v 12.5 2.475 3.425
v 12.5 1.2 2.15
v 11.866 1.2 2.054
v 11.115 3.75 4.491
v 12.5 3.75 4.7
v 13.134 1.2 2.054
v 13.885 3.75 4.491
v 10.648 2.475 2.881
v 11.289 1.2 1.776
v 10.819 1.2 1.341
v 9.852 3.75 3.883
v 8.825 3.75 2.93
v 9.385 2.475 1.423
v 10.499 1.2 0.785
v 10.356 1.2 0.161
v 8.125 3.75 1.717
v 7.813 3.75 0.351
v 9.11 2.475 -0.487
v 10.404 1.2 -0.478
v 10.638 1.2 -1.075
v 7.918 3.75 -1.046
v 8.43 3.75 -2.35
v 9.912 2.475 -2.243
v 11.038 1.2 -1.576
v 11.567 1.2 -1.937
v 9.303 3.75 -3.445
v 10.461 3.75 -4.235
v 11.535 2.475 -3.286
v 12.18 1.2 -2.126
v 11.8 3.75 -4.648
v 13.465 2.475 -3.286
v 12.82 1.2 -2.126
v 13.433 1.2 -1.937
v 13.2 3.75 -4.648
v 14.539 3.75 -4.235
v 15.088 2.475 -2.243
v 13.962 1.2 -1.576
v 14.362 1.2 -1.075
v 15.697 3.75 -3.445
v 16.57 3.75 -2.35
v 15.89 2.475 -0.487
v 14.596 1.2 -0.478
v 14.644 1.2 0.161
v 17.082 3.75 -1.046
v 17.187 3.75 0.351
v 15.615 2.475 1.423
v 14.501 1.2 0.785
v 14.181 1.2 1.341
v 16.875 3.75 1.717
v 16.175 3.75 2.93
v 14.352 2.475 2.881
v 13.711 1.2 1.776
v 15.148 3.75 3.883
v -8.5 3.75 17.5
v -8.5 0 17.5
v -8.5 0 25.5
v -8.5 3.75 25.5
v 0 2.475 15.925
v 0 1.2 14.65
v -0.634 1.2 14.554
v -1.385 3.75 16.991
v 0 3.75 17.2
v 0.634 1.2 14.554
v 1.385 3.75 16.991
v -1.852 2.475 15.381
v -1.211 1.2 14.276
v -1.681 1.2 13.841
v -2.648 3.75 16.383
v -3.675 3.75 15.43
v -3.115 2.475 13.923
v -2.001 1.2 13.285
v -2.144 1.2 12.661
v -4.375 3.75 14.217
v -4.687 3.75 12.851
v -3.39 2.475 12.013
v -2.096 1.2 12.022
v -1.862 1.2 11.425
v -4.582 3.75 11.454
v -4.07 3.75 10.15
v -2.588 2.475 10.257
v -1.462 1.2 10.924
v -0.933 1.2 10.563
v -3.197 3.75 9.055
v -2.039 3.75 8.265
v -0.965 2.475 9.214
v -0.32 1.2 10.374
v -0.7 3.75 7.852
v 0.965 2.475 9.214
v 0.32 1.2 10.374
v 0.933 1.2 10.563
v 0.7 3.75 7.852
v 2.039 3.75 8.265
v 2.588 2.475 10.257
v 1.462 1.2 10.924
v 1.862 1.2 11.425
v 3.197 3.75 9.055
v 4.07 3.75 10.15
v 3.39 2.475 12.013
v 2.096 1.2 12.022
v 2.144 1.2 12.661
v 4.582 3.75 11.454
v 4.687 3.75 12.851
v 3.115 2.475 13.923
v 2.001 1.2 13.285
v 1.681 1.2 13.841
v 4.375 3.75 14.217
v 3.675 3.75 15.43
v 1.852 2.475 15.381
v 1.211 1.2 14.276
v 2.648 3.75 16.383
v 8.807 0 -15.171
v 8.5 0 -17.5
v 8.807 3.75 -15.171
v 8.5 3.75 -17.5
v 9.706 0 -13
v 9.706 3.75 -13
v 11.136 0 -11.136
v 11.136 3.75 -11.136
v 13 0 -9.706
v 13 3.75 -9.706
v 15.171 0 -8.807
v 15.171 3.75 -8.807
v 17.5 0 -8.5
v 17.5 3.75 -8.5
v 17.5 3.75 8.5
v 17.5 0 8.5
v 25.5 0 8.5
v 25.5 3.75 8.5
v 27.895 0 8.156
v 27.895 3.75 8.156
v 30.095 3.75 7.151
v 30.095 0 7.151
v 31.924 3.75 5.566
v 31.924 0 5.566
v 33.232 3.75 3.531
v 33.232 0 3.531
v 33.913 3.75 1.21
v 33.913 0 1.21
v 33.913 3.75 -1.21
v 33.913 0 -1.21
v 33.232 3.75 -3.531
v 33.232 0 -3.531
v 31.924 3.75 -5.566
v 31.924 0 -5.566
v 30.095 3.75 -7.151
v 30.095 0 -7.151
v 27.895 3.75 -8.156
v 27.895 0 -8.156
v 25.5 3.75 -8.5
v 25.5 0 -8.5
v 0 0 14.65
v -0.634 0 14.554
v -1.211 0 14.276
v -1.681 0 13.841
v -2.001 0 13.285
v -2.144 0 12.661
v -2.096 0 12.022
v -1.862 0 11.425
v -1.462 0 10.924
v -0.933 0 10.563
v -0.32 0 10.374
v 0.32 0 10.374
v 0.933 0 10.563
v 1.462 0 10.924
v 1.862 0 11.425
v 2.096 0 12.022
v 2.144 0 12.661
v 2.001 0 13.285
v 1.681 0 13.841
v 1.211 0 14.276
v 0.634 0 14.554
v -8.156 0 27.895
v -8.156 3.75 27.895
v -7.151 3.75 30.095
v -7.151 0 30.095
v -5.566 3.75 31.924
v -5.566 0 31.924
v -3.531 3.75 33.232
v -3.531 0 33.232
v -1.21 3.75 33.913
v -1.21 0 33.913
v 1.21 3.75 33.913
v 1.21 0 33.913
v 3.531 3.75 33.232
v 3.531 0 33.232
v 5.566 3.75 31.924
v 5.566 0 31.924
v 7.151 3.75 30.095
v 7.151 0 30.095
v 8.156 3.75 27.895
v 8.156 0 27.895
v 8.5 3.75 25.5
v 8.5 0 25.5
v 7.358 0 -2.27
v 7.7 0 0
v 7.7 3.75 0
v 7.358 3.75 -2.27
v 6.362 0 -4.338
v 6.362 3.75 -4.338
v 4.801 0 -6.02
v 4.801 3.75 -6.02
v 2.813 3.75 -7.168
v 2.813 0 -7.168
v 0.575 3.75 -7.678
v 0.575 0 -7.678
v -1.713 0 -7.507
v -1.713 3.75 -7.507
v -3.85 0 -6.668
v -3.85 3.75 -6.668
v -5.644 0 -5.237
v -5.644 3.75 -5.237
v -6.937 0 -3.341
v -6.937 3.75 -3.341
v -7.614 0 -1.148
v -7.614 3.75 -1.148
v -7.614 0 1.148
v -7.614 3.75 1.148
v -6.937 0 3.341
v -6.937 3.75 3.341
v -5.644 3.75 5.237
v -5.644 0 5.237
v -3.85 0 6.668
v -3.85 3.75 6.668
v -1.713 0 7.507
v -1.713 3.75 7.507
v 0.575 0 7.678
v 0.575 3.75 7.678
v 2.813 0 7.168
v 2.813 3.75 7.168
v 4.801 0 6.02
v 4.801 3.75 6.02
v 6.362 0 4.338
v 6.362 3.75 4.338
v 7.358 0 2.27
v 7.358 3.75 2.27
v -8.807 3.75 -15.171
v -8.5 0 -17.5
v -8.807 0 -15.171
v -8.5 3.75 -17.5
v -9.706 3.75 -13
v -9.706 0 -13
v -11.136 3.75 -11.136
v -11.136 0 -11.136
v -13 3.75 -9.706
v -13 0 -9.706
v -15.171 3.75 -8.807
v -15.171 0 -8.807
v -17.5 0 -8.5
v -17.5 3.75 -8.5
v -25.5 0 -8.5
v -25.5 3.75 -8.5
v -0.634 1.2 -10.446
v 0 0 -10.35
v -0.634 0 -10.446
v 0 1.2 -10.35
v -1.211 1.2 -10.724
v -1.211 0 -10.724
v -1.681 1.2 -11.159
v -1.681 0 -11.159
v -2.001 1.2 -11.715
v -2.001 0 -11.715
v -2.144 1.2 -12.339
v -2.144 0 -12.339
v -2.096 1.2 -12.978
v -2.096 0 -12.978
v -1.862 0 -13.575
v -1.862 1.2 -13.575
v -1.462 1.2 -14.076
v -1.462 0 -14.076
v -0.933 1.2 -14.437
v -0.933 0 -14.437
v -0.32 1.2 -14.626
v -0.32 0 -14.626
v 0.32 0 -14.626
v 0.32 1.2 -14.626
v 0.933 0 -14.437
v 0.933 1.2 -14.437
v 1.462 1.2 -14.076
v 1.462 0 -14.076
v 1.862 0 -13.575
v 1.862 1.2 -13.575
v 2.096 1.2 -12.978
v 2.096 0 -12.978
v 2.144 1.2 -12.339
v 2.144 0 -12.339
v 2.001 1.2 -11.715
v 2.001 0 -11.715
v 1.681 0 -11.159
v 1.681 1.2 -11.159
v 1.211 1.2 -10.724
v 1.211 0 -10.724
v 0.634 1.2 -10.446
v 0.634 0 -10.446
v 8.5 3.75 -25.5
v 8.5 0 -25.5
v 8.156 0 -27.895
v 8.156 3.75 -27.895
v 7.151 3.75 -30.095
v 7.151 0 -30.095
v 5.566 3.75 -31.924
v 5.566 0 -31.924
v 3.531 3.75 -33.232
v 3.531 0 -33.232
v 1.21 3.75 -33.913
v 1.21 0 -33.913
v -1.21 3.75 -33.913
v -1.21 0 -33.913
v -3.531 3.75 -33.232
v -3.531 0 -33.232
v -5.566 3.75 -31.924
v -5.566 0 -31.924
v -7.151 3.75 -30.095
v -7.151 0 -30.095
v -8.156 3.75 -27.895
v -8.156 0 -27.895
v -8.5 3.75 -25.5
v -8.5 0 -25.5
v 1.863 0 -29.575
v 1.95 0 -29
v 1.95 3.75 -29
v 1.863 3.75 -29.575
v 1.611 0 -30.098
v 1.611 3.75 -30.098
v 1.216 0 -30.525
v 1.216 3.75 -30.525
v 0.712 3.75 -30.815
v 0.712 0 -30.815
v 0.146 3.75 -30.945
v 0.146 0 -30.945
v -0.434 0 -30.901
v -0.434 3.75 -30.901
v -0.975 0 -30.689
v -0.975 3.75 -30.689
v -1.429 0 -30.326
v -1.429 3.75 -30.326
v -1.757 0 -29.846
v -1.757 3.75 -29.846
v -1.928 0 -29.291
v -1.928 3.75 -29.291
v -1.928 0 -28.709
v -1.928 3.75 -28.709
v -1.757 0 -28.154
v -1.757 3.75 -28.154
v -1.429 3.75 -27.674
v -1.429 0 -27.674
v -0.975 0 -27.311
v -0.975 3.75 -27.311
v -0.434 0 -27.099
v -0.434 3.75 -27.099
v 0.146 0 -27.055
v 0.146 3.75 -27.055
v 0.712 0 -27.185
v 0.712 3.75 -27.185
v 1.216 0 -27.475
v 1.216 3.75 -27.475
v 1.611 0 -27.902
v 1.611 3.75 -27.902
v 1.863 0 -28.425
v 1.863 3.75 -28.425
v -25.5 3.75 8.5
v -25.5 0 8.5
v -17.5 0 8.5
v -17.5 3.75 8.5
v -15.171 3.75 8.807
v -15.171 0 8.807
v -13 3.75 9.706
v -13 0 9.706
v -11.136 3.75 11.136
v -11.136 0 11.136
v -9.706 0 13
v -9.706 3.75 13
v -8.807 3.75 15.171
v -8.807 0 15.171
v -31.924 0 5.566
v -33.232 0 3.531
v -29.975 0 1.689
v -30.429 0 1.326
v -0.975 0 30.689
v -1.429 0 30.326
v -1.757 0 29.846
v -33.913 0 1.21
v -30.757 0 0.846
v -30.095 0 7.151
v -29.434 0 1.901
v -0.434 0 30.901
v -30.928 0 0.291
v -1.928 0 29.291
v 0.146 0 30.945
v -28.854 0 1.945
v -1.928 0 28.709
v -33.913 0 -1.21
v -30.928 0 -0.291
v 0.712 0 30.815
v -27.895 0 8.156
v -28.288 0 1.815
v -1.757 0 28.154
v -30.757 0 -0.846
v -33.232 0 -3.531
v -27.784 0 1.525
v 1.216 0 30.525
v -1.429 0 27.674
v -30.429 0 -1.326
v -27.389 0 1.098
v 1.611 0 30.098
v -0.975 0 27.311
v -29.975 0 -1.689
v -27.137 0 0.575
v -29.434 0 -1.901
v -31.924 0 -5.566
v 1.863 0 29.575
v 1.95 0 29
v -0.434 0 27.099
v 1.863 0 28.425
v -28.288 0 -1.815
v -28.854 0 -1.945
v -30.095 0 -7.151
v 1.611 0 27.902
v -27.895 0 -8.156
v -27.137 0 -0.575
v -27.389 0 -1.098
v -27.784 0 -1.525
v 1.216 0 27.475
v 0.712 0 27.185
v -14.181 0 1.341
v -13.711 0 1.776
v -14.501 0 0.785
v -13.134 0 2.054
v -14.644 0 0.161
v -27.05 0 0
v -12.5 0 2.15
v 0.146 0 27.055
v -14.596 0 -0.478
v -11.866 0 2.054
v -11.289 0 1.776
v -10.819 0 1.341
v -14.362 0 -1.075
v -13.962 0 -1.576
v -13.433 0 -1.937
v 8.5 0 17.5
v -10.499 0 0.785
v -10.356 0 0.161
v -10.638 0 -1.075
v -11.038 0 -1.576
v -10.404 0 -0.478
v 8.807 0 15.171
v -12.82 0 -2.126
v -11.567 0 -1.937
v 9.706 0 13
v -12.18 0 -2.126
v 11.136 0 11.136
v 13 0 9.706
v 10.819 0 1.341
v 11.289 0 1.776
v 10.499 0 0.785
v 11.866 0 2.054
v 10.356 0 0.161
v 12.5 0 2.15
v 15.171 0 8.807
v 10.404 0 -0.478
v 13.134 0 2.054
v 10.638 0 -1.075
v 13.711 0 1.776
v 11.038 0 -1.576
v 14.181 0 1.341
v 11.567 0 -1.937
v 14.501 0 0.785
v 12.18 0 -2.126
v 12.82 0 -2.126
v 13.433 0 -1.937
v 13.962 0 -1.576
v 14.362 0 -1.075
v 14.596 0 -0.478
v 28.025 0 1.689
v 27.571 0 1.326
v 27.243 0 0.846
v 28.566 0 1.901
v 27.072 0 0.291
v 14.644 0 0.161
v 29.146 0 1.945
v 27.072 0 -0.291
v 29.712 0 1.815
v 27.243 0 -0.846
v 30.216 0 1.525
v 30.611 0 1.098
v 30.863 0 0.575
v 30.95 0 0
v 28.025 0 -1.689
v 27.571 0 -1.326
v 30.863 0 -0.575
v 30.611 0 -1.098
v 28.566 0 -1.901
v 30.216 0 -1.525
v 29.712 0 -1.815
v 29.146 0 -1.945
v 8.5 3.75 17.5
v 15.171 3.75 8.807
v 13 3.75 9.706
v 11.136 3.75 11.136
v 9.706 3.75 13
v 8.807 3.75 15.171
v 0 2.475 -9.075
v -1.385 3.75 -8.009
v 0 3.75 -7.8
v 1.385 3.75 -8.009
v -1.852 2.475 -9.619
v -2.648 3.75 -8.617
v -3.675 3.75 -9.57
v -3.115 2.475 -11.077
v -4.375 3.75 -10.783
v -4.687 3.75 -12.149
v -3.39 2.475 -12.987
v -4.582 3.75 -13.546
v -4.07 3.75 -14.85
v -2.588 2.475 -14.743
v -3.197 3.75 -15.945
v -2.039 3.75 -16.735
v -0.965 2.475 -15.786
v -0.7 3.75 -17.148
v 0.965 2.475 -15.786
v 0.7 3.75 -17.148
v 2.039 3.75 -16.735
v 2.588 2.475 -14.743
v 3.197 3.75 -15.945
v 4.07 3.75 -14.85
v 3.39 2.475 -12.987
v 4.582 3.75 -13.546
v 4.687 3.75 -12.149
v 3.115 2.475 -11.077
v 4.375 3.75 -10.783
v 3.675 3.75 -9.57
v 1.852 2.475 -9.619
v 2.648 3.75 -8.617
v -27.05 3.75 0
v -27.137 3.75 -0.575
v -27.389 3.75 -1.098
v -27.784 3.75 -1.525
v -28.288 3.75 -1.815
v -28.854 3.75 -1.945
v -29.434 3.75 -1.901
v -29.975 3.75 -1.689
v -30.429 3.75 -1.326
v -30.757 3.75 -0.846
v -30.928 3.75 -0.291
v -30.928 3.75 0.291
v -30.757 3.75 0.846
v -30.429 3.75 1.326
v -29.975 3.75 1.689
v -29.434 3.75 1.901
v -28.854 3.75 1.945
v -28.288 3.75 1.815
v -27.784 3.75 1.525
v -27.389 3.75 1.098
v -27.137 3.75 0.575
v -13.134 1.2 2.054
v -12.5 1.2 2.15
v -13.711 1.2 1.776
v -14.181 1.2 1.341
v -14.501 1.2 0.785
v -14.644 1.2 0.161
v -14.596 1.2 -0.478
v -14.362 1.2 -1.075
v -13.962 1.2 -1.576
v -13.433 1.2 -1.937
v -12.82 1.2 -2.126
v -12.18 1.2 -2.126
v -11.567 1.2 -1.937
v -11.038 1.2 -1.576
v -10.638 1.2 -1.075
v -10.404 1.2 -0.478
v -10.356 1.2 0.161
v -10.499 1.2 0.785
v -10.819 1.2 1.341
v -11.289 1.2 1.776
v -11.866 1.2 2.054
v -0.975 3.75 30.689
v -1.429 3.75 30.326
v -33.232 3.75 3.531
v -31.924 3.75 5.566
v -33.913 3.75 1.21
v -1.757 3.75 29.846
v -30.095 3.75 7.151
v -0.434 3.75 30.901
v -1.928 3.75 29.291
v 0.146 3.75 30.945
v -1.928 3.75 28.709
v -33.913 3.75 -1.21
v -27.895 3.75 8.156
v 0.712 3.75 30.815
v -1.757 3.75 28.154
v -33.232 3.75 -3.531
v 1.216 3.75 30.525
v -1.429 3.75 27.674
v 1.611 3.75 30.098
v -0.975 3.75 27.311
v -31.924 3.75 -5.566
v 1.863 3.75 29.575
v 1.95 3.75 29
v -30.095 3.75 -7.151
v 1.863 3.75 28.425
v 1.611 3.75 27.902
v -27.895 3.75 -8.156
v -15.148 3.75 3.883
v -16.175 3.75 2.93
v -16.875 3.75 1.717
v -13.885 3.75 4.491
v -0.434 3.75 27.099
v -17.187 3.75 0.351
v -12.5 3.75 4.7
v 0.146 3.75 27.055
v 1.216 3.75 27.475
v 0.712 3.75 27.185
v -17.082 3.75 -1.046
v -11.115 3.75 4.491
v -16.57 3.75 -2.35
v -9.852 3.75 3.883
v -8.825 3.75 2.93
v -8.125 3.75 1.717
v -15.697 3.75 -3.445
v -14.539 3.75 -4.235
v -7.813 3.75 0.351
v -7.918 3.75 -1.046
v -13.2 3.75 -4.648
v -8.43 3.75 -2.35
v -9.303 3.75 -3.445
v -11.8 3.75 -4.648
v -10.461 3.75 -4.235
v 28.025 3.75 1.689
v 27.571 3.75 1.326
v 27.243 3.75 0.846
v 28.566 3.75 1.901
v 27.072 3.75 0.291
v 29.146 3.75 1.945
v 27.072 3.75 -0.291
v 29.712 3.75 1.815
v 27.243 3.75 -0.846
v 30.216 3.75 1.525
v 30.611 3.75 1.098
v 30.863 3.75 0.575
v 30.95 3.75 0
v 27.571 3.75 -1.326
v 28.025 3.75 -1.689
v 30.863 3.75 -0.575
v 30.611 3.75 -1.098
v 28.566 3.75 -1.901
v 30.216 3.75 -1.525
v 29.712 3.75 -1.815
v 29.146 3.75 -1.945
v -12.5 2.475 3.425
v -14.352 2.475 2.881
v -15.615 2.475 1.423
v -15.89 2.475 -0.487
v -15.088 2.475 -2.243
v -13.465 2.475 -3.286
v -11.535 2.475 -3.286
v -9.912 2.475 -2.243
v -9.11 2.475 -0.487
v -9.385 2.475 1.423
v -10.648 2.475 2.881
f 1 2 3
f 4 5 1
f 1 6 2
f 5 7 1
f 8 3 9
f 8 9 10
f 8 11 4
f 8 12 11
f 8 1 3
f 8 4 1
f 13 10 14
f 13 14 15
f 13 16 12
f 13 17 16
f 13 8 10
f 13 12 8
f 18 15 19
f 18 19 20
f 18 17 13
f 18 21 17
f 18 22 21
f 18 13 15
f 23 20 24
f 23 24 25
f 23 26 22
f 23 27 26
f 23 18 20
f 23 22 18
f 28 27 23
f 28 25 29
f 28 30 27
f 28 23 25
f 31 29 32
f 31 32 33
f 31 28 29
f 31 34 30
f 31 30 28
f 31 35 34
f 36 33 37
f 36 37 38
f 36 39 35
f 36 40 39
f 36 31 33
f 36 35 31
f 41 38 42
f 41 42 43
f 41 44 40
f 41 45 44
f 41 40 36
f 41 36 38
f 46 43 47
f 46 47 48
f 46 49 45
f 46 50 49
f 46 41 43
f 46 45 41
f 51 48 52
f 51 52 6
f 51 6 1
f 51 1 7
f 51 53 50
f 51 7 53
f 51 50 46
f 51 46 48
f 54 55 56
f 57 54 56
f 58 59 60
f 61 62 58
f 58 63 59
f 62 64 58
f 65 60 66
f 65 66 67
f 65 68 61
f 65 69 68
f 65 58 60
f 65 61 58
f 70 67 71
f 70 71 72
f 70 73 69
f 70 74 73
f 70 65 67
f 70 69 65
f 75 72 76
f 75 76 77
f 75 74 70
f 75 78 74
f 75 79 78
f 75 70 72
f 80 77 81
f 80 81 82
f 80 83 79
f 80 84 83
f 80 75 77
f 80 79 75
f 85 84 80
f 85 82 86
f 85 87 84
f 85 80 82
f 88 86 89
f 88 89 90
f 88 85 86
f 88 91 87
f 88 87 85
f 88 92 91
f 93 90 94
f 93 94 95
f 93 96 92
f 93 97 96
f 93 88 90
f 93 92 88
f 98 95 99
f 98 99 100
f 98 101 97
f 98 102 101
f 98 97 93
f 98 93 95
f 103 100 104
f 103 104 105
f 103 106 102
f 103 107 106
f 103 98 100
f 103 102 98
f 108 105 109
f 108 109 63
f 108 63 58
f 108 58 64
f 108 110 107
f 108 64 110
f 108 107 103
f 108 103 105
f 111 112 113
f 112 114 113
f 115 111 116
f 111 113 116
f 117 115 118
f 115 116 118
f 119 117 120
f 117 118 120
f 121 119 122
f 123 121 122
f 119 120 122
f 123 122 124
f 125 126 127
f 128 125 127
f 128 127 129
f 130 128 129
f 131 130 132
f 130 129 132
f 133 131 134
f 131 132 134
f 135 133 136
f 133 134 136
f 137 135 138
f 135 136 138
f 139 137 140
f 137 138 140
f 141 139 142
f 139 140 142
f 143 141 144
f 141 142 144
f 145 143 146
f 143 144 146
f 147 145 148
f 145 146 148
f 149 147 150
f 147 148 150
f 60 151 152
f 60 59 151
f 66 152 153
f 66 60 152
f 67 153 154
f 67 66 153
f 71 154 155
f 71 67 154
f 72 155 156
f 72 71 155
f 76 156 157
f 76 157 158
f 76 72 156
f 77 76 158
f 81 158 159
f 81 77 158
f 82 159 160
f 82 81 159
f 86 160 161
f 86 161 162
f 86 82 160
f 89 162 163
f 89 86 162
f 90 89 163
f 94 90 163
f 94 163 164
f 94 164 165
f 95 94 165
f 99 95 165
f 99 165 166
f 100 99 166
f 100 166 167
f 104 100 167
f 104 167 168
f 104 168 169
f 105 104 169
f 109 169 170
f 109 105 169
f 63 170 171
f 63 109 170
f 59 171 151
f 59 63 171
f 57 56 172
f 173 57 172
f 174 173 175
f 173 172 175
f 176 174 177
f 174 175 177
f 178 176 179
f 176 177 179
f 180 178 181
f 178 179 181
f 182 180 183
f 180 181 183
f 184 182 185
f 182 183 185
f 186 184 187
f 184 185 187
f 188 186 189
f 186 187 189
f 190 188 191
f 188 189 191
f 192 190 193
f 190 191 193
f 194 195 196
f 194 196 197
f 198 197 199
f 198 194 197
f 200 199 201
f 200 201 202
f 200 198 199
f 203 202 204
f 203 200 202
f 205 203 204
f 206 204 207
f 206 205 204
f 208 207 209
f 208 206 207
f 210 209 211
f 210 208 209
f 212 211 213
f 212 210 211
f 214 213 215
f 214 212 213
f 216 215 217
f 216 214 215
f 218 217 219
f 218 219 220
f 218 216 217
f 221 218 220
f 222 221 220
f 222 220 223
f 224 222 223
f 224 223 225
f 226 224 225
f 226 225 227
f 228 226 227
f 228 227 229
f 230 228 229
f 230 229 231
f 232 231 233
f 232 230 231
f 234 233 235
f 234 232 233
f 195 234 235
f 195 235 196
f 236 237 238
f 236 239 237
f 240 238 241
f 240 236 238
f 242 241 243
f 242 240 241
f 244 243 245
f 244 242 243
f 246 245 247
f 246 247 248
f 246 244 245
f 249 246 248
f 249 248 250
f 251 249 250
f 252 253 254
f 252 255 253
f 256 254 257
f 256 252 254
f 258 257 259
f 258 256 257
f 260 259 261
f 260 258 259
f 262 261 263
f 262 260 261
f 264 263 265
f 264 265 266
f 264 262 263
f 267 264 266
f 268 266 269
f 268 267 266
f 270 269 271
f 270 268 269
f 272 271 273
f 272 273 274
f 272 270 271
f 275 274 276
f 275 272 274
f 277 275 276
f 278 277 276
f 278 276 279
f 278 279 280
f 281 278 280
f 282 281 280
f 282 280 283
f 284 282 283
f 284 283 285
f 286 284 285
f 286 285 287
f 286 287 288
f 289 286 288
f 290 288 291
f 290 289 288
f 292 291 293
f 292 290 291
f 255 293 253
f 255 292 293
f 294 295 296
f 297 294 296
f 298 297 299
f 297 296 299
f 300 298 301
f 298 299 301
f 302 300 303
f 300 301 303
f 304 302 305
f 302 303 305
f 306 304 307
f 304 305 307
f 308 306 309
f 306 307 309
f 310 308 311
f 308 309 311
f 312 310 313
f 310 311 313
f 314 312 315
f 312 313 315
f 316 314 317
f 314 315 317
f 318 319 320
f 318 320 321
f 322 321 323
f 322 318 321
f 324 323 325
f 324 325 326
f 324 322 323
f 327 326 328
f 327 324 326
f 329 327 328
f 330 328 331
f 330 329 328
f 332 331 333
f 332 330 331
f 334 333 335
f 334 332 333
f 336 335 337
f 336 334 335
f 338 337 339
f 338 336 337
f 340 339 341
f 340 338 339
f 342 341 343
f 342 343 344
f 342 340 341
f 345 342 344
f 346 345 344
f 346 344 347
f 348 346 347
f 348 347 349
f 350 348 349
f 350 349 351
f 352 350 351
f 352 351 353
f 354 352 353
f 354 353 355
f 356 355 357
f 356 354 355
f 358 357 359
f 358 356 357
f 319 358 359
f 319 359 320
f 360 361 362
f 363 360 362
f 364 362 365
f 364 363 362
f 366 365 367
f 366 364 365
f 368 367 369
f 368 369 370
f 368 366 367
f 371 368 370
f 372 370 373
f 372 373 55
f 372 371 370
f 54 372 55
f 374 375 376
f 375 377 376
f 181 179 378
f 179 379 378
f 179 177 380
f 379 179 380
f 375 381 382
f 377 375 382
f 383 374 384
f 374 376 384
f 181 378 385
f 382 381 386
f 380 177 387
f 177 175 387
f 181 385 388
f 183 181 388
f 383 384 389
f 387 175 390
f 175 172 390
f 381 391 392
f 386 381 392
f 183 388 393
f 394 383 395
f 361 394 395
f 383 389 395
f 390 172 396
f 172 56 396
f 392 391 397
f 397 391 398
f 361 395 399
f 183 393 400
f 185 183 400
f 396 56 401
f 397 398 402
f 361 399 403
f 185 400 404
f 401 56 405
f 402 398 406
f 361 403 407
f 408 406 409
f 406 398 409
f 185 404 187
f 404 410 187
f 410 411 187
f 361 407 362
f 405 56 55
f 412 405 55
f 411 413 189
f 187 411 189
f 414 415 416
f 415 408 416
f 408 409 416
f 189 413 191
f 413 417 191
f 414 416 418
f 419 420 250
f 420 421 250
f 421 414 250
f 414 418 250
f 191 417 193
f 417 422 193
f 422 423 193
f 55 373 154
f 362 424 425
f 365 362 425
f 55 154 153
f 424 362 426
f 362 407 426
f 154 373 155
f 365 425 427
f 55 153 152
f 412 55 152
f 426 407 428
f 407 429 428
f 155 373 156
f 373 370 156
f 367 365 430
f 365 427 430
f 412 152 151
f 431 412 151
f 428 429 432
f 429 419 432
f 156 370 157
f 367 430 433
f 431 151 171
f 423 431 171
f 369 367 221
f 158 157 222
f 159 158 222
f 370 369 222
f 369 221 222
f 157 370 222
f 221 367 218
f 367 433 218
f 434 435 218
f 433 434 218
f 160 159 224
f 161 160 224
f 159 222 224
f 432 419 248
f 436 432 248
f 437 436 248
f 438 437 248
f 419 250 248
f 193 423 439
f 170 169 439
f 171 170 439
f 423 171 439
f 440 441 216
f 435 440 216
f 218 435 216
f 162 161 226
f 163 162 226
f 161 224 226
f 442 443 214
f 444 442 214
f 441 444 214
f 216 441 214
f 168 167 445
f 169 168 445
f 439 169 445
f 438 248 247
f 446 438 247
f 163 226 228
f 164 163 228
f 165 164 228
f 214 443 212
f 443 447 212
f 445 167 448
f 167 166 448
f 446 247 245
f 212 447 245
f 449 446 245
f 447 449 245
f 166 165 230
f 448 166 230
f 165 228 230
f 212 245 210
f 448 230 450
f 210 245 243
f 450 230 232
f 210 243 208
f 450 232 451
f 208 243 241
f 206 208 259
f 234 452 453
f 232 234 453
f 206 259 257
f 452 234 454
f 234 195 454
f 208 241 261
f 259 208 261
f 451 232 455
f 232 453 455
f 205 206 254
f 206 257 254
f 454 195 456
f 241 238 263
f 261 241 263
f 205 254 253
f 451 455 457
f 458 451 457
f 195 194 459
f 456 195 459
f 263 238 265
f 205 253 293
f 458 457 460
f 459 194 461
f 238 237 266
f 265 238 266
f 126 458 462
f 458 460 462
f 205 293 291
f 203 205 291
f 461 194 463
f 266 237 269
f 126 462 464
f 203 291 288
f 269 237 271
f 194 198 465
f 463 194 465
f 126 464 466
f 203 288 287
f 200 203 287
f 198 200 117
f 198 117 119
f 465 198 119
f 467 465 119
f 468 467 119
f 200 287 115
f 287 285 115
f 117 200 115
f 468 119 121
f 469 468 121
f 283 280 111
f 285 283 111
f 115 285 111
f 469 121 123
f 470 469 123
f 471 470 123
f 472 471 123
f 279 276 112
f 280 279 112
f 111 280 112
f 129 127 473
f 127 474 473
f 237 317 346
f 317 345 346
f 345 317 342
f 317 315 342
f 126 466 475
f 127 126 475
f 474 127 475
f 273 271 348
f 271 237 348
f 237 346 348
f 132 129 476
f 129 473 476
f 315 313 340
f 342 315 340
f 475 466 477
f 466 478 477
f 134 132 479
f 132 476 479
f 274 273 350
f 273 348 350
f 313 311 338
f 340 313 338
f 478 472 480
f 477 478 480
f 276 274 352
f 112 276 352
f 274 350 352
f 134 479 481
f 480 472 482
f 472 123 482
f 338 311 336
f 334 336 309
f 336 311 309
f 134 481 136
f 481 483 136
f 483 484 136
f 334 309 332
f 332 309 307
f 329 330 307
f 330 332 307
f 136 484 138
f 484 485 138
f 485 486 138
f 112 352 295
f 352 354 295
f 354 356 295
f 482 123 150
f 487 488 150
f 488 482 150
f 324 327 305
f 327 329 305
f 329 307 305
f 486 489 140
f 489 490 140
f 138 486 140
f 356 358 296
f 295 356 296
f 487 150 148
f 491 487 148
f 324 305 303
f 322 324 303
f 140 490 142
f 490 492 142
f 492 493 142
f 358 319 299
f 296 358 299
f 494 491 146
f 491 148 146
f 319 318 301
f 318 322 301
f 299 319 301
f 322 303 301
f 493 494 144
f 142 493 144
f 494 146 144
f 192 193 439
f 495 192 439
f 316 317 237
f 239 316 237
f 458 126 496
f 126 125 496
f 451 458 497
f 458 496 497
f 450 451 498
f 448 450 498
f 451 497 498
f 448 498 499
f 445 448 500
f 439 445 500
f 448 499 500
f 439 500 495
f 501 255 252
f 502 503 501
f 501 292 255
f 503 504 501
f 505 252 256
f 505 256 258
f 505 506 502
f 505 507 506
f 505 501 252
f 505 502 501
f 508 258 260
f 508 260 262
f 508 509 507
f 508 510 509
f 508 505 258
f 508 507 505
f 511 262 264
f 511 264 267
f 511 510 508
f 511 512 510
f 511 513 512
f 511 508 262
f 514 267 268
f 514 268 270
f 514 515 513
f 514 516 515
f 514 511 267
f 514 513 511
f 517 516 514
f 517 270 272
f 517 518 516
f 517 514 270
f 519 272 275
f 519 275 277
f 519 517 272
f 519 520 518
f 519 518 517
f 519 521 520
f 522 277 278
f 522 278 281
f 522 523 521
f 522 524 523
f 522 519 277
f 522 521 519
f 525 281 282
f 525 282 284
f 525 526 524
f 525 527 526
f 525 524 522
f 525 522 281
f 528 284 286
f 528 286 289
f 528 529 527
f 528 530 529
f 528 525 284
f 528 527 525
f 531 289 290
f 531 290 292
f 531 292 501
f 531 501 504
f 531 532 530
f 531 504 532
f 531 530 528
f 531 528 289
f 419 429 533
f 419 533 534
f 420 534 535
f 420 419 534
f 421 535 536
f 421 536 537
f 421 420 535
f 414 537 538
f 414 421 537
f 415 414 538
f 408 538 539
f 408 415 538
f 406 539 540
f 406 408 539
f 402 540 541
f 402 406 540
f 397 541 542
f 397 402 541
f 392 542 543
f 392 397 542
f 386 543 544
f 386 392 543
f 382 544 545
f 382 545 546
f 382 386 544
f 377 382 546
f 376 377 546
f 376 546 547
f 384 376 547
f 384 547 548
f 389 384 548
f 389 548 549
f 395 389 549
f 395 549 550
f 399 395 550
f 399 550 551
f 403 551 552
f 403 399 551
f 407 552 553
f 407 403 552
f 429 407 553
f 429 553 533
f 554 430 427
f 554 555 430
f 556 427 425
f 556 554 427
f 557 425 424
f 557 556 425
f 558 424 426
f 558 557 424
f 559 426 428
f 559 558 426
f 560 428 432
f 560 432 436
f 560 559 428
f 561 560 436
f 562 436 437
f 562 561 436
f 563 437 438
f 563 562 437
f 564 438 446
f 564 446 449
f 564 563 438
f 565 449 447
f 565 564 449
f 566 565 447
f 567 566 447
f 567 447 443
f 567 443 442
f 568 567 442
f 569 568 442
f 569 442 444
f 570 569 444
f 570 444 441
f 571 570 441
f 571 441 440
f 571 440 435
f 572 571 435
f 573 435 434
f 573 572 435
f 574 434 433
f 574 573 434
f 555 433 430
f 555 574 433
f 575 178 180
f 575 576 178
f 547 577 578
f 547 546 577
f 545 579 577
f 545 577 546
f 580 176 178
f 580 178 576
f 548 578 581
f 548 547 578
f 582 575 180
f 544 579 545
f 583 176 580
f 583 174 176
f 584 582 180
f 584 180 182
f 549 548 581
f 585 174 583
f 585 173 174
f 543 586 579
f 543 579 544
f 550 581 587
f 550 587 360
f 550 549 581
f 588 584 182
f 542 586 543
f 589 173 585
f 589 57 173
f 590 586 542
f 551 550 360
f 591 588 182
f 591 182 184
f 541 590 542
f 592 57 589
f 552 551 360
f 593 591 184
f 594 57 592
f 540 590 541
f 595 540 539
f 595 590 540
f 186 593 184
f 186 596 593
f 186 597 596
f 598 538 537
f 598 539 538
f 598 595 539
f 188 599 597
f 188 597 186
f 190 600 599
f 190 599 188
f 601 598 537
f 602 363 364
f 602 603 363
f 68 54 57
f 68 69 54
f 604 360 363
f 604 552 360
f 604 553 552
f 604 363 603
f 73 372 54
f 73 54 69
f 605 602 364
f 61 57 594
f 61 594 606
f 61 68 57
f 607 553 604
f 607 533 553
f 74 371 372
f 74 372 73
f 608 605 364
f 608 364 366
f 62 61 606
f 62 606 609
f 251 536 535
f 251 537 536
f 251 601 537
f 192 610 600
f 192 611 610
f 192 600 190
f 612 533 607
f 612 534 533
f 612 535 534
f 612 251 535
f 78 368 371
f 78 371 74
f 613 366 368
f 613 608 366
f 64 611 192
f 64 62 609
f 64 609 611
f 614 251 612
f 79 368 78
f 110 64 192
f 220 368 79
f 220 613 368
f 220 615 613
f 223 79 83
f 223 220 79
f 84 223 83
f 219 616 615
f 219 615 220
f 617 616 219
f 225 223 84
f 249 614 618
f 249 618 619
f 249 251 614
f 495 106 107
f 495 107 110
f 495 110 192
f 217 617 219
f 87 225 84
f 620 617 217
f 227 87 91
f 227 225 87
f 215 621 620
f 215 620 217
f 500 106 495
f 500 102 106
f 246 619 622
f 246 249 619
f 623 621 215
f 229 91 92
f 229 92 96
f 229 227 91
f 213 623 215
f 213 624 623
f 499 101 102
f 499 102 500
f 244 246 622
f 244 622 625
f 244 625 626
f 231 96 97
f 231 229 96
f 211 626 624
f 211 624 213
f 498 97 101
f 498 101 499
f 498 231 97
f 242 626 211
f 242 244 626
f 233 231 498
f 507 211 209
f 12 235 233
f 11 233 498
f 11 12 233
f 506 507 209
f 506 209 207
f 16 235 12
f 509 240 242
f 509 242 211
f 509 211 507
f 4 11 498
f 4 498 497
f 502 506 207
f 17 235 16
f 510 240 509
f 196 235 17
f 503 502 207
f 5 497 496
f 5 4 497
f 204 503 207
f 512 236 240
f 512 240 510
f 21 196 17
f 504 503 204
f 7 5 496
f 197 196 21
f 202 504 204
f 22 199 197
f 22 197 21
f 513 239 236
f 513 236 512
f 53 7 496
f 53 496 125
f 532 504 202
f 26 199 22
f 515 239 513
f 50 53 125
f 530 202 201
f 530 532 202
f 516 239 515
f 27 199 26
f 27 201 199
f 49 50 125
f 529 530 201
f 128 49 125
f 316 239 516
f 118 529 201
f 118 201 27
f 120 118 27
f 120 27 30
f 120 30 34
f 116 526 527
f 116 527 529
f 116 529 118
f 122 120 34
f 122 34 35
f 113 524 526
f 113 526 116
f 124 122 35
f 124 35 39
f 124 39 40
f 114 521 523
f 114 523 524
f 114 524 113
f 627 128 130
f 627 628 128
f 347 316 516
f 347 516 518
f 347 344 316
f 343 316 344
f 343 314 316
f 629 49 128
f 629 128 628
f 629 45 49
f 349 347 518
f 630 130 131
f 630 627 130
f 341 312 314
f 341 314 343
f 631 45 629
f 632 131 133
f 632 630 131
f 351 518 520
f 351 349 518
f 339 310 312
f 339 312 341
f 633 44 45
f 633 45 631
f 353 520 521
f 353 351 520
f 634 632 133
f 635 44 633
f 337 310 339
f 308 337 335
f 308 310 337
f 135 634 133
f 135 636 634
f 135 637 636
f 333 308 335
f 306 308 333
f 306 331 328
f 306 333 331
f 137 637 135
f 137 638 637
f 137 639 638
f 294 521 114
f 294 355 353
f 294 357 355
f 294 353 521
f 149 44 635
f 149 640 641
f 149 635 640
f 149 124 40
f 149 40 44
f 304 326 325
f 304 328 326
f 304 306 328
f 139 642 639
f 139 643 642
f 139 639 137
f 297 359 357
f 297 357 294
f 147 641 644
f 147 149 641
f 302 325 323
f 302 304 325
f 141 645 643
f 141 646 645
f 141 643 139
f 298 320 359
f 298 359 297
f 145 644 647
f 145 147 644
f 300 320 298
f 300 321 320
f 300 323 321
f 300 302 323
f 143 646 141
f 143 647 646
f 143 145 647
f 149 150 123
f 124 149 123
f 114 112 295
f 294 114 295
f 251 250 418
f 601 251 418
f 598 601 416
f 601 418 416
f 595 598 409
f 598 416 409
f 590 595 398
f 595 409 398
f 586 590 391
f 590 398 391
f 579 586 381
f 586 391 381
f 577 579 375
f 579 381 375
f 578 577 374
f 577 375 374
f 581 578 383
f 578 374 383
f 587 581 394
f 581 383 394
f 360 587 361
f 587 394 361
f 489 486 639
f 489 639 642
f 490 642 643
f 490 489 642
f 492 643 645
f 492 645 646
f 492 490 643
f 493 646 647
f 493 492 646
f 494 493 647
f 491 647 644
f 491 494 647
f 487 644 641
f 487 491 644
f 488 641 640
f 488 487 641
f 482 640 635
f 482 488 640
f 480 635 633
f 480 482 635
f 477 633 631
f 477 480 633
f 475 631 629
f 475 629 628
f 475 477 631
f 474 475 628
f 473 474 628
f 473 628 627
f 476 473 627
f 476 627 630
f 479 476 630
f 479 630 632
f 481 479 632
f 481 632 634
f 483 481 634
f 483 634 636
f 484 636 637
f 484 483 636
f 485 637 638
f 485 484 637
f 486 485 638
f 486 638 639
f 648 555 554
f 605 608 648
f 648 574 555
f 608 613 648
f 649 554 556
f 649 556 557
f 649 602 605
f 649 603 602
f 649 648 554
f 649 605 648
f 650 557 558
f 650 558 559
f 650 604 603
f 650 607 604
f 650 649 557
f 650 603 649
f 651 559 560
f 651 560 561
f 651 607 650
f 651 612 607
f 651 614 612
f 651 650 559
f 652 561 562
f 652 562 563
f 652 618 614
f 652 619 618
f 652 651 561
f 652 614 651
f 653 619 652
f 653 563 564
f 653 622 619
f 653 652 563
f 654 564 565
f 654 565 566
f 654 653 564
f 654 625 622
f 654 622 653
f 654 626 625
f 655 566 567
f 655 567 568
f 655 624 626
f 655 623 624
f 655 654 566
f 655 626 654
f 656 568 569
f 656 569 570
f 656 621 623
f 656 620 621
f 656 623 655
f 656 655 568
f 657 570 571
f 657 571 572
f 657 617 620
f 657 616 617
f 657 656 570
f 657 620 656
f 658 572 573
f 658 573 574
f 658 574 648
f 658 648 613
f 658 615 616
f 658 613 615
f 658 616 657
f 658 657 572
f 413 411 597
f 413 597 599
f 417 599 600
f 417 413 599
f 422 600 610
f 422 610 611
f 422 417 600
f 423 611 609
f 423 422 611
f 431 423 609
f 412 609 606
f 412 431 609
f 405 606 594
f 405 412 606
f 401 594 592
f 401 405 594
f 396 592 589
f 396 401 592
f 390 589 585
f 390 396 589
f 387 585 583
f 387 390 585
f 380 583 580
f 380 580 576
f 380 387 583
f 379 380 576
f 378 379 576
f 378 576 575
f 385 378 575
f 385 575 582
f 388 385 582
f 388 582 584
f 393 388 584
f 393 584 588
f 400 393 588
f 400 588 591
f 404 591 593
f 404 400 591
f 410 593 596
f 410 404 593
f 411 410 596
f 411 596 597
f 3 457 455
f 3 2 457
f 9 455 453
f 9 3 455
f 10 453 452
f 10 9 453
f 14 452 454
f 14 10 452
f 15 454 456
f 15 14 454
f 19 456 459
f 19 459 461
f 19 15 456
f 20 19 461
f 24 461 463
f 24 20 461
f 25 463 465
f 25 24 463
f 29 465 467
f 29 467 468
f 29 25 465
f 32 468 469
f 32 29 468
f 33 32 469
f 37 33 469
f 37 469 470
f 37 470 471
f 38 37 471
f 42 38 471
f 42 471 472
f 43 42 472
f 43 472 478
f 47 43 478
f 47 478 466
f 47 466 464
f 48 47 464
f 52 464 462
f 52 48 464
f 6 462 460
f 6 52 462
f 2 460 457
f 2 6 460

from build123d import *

# Parameters (mm, degrees)
SKETCH1_R                                      = 7.7
SKETCH1_R_2                                    = 1.95
BOSS_EXTRUDE1_DEPTH                            = 3.75
FILLET1_R                                      = 9
CSK_FOR_M4_FLAT_HEAD_MACHINE_SCREW1_AT_2_COUNT = 2
CSK_FOR_M4_FLAT_HEAD_MACHINE_SCREW1_AT_2_PITCH = 17.67766953
CSK_FOR_M4_FLAT_HEAD_MACHINE_SCREW1_AT_3_COUNT = 2
CSK_FOR_M4_FLAT_HEAD_MACHINE_SCREW1_AT_3_PITCH = 17.67766953
CSK_FOR_M4_FLAT_HEAD_MACHINE_SCREW1_AT_4_COUNT = 2
CSK_FOR_M4_FLAT_HEAD_MACHINE_SCREW1_AT_4_PITCH = 25


with BuildPart() as part:
    # Sketch1 → Boss-Extrude1 (new body)
    with BuildSketch(Plane(origin=(0, 0, 0), x_dir=(1, 0, 0), z_dir=(0, 1, 0))):
        with BuildLine():
            Line((-8.5, 25.5), (-8.5, 8.5))
            Line((-8.5, 8.5), (-25.5, 8.5))
            ThreePointArc((-25.5, 8.5), (-34, 0), (-25.5, -8.5))
            Line((-25.5, -8.5), (-8.5, -8.5))
            Line((-8.5, -8.5), (-8.5, -25.5))
            ThreePointArc((-8.5, -25.5), (0, -34), (8.5, -25.5))
            Line((8.5, -25.5), (8.5, -8.5))
            Line((8.5, -8.5), (25.5, -8.5))
            ThreePointArc((25.5, -8.5), (34, 0), (25.5, 8.5))
            Line((25.5, 8.5), (8.5, 8.5))
            Line((8.5, 8.5), (8.5, 25.5))
            ThreePointArc((8.5, 25.5), (0, 34), (-8.5, 25.5))
        make_face()
        Circle(SKETCH1_R, mode=Mode.SUBTRACT)
        with Locations((0, 29)):
            Circle(SKETCH1_R_2, mode=Mode.SUBTRACT)
        with Locations((29, 0)):
            Circle(SKETCH1_R_2, mode=Mode.SUBTRACT)
        with Locations((0, -29)):
            Circle(SKETCH1_R_2, mode=Mode.SUBTRACT)
        with Locations((-29, 0)):
            Circle(SKETCH1_R_2, mode=Mode.SUBTRACT)
    extrude(amount=BOSS_EXTRUDE1_DEPTH)

    # Fillet1
    fillet1_edges = [part.edges().sort_by_distance(p)[0] for p in [
        (-8.5, 1.875, -8.5),
        (8.5, 1.875, -8.5),
        (8.5, 1.875, 8.5),
        (-8.5, 1.875, 8.5),
    ]]
    fillet(fillet1_edges, radius=FILLET1_R)

    # Sketch3 → CSK for M4 Flat Head Machine Screw1 (revolve, cut)
    with BuildSketch(Plane(origin=(12.5, 3.75, 0), x_dir=(0, 0, 1), z_dir=(1, 0, 0))):
        Polygon((0, 0), (0, 3.75), (2.15, 3.75), (2.15, 2.55), (4.7, 0), align=None)
    csk_for_m4_flat_head_machine_screw1 = revolve(axis=Axis((12.5, 10.1, 0), (0, -1, 0)), mode=Mode.SUBTRACT)

    # CSK for M4 Flat Head Machine Screw1 at 2: CSK for M4 Flat Head Machine Screw1 ×2
    with Locations(*[Vector(-0.707106781, 0, -0.707106781) * (i * CSK_FOR_M4_FLAT_HEAD_MACHINE_SCREW1_AT_2_PITCH) for i in range(1, CSK_FOR_M4_FLAT_HEAD_MACHINE_SCREW1_AT_2_COUNT)]):
        add(csk_for_m4_flat_head_machine_screw1, mode=Mode.SUBTRACT)

    # CSK for M4 Flat Head Machine Screw1 at 3: CSK for M4 Flat Head Machine Screw1 ×2
    with Locations(*[Vector(-0.707106781, 0, 0.707106781) * (i * CSK_FOR_M4_FLAT_HEAD_MACHINE_SCREW1_AT_3_PITCH) for i in range(1, CSK_FOR_M4_FLAT_HEAD_MACHINE_SCREW1_AT_3_COUNT)]):
        add(csk_for_m4_flat_head_machine_screw1, mode=Mode.SUBTRACT)

    # CSK for M4 Flat Head Machine Screw1 at 4: CSK for M4 Flat Head Machine Screw1 ×2
    with Locations(*[(-i * CSK_FOR_M4_FLAT_HEAD_MACHINE_SCREW1_AT_4_PITCH, 0, 0) for i in range(1, CSK_FOR_M4_FLAT_HEAD_MACHINE_SCREW1_AT_4_COUNT)]):
        add(csk_for_m4_flat_head_machine_screw1, mode=Mode.SUBTRACT)


solid = part.part
